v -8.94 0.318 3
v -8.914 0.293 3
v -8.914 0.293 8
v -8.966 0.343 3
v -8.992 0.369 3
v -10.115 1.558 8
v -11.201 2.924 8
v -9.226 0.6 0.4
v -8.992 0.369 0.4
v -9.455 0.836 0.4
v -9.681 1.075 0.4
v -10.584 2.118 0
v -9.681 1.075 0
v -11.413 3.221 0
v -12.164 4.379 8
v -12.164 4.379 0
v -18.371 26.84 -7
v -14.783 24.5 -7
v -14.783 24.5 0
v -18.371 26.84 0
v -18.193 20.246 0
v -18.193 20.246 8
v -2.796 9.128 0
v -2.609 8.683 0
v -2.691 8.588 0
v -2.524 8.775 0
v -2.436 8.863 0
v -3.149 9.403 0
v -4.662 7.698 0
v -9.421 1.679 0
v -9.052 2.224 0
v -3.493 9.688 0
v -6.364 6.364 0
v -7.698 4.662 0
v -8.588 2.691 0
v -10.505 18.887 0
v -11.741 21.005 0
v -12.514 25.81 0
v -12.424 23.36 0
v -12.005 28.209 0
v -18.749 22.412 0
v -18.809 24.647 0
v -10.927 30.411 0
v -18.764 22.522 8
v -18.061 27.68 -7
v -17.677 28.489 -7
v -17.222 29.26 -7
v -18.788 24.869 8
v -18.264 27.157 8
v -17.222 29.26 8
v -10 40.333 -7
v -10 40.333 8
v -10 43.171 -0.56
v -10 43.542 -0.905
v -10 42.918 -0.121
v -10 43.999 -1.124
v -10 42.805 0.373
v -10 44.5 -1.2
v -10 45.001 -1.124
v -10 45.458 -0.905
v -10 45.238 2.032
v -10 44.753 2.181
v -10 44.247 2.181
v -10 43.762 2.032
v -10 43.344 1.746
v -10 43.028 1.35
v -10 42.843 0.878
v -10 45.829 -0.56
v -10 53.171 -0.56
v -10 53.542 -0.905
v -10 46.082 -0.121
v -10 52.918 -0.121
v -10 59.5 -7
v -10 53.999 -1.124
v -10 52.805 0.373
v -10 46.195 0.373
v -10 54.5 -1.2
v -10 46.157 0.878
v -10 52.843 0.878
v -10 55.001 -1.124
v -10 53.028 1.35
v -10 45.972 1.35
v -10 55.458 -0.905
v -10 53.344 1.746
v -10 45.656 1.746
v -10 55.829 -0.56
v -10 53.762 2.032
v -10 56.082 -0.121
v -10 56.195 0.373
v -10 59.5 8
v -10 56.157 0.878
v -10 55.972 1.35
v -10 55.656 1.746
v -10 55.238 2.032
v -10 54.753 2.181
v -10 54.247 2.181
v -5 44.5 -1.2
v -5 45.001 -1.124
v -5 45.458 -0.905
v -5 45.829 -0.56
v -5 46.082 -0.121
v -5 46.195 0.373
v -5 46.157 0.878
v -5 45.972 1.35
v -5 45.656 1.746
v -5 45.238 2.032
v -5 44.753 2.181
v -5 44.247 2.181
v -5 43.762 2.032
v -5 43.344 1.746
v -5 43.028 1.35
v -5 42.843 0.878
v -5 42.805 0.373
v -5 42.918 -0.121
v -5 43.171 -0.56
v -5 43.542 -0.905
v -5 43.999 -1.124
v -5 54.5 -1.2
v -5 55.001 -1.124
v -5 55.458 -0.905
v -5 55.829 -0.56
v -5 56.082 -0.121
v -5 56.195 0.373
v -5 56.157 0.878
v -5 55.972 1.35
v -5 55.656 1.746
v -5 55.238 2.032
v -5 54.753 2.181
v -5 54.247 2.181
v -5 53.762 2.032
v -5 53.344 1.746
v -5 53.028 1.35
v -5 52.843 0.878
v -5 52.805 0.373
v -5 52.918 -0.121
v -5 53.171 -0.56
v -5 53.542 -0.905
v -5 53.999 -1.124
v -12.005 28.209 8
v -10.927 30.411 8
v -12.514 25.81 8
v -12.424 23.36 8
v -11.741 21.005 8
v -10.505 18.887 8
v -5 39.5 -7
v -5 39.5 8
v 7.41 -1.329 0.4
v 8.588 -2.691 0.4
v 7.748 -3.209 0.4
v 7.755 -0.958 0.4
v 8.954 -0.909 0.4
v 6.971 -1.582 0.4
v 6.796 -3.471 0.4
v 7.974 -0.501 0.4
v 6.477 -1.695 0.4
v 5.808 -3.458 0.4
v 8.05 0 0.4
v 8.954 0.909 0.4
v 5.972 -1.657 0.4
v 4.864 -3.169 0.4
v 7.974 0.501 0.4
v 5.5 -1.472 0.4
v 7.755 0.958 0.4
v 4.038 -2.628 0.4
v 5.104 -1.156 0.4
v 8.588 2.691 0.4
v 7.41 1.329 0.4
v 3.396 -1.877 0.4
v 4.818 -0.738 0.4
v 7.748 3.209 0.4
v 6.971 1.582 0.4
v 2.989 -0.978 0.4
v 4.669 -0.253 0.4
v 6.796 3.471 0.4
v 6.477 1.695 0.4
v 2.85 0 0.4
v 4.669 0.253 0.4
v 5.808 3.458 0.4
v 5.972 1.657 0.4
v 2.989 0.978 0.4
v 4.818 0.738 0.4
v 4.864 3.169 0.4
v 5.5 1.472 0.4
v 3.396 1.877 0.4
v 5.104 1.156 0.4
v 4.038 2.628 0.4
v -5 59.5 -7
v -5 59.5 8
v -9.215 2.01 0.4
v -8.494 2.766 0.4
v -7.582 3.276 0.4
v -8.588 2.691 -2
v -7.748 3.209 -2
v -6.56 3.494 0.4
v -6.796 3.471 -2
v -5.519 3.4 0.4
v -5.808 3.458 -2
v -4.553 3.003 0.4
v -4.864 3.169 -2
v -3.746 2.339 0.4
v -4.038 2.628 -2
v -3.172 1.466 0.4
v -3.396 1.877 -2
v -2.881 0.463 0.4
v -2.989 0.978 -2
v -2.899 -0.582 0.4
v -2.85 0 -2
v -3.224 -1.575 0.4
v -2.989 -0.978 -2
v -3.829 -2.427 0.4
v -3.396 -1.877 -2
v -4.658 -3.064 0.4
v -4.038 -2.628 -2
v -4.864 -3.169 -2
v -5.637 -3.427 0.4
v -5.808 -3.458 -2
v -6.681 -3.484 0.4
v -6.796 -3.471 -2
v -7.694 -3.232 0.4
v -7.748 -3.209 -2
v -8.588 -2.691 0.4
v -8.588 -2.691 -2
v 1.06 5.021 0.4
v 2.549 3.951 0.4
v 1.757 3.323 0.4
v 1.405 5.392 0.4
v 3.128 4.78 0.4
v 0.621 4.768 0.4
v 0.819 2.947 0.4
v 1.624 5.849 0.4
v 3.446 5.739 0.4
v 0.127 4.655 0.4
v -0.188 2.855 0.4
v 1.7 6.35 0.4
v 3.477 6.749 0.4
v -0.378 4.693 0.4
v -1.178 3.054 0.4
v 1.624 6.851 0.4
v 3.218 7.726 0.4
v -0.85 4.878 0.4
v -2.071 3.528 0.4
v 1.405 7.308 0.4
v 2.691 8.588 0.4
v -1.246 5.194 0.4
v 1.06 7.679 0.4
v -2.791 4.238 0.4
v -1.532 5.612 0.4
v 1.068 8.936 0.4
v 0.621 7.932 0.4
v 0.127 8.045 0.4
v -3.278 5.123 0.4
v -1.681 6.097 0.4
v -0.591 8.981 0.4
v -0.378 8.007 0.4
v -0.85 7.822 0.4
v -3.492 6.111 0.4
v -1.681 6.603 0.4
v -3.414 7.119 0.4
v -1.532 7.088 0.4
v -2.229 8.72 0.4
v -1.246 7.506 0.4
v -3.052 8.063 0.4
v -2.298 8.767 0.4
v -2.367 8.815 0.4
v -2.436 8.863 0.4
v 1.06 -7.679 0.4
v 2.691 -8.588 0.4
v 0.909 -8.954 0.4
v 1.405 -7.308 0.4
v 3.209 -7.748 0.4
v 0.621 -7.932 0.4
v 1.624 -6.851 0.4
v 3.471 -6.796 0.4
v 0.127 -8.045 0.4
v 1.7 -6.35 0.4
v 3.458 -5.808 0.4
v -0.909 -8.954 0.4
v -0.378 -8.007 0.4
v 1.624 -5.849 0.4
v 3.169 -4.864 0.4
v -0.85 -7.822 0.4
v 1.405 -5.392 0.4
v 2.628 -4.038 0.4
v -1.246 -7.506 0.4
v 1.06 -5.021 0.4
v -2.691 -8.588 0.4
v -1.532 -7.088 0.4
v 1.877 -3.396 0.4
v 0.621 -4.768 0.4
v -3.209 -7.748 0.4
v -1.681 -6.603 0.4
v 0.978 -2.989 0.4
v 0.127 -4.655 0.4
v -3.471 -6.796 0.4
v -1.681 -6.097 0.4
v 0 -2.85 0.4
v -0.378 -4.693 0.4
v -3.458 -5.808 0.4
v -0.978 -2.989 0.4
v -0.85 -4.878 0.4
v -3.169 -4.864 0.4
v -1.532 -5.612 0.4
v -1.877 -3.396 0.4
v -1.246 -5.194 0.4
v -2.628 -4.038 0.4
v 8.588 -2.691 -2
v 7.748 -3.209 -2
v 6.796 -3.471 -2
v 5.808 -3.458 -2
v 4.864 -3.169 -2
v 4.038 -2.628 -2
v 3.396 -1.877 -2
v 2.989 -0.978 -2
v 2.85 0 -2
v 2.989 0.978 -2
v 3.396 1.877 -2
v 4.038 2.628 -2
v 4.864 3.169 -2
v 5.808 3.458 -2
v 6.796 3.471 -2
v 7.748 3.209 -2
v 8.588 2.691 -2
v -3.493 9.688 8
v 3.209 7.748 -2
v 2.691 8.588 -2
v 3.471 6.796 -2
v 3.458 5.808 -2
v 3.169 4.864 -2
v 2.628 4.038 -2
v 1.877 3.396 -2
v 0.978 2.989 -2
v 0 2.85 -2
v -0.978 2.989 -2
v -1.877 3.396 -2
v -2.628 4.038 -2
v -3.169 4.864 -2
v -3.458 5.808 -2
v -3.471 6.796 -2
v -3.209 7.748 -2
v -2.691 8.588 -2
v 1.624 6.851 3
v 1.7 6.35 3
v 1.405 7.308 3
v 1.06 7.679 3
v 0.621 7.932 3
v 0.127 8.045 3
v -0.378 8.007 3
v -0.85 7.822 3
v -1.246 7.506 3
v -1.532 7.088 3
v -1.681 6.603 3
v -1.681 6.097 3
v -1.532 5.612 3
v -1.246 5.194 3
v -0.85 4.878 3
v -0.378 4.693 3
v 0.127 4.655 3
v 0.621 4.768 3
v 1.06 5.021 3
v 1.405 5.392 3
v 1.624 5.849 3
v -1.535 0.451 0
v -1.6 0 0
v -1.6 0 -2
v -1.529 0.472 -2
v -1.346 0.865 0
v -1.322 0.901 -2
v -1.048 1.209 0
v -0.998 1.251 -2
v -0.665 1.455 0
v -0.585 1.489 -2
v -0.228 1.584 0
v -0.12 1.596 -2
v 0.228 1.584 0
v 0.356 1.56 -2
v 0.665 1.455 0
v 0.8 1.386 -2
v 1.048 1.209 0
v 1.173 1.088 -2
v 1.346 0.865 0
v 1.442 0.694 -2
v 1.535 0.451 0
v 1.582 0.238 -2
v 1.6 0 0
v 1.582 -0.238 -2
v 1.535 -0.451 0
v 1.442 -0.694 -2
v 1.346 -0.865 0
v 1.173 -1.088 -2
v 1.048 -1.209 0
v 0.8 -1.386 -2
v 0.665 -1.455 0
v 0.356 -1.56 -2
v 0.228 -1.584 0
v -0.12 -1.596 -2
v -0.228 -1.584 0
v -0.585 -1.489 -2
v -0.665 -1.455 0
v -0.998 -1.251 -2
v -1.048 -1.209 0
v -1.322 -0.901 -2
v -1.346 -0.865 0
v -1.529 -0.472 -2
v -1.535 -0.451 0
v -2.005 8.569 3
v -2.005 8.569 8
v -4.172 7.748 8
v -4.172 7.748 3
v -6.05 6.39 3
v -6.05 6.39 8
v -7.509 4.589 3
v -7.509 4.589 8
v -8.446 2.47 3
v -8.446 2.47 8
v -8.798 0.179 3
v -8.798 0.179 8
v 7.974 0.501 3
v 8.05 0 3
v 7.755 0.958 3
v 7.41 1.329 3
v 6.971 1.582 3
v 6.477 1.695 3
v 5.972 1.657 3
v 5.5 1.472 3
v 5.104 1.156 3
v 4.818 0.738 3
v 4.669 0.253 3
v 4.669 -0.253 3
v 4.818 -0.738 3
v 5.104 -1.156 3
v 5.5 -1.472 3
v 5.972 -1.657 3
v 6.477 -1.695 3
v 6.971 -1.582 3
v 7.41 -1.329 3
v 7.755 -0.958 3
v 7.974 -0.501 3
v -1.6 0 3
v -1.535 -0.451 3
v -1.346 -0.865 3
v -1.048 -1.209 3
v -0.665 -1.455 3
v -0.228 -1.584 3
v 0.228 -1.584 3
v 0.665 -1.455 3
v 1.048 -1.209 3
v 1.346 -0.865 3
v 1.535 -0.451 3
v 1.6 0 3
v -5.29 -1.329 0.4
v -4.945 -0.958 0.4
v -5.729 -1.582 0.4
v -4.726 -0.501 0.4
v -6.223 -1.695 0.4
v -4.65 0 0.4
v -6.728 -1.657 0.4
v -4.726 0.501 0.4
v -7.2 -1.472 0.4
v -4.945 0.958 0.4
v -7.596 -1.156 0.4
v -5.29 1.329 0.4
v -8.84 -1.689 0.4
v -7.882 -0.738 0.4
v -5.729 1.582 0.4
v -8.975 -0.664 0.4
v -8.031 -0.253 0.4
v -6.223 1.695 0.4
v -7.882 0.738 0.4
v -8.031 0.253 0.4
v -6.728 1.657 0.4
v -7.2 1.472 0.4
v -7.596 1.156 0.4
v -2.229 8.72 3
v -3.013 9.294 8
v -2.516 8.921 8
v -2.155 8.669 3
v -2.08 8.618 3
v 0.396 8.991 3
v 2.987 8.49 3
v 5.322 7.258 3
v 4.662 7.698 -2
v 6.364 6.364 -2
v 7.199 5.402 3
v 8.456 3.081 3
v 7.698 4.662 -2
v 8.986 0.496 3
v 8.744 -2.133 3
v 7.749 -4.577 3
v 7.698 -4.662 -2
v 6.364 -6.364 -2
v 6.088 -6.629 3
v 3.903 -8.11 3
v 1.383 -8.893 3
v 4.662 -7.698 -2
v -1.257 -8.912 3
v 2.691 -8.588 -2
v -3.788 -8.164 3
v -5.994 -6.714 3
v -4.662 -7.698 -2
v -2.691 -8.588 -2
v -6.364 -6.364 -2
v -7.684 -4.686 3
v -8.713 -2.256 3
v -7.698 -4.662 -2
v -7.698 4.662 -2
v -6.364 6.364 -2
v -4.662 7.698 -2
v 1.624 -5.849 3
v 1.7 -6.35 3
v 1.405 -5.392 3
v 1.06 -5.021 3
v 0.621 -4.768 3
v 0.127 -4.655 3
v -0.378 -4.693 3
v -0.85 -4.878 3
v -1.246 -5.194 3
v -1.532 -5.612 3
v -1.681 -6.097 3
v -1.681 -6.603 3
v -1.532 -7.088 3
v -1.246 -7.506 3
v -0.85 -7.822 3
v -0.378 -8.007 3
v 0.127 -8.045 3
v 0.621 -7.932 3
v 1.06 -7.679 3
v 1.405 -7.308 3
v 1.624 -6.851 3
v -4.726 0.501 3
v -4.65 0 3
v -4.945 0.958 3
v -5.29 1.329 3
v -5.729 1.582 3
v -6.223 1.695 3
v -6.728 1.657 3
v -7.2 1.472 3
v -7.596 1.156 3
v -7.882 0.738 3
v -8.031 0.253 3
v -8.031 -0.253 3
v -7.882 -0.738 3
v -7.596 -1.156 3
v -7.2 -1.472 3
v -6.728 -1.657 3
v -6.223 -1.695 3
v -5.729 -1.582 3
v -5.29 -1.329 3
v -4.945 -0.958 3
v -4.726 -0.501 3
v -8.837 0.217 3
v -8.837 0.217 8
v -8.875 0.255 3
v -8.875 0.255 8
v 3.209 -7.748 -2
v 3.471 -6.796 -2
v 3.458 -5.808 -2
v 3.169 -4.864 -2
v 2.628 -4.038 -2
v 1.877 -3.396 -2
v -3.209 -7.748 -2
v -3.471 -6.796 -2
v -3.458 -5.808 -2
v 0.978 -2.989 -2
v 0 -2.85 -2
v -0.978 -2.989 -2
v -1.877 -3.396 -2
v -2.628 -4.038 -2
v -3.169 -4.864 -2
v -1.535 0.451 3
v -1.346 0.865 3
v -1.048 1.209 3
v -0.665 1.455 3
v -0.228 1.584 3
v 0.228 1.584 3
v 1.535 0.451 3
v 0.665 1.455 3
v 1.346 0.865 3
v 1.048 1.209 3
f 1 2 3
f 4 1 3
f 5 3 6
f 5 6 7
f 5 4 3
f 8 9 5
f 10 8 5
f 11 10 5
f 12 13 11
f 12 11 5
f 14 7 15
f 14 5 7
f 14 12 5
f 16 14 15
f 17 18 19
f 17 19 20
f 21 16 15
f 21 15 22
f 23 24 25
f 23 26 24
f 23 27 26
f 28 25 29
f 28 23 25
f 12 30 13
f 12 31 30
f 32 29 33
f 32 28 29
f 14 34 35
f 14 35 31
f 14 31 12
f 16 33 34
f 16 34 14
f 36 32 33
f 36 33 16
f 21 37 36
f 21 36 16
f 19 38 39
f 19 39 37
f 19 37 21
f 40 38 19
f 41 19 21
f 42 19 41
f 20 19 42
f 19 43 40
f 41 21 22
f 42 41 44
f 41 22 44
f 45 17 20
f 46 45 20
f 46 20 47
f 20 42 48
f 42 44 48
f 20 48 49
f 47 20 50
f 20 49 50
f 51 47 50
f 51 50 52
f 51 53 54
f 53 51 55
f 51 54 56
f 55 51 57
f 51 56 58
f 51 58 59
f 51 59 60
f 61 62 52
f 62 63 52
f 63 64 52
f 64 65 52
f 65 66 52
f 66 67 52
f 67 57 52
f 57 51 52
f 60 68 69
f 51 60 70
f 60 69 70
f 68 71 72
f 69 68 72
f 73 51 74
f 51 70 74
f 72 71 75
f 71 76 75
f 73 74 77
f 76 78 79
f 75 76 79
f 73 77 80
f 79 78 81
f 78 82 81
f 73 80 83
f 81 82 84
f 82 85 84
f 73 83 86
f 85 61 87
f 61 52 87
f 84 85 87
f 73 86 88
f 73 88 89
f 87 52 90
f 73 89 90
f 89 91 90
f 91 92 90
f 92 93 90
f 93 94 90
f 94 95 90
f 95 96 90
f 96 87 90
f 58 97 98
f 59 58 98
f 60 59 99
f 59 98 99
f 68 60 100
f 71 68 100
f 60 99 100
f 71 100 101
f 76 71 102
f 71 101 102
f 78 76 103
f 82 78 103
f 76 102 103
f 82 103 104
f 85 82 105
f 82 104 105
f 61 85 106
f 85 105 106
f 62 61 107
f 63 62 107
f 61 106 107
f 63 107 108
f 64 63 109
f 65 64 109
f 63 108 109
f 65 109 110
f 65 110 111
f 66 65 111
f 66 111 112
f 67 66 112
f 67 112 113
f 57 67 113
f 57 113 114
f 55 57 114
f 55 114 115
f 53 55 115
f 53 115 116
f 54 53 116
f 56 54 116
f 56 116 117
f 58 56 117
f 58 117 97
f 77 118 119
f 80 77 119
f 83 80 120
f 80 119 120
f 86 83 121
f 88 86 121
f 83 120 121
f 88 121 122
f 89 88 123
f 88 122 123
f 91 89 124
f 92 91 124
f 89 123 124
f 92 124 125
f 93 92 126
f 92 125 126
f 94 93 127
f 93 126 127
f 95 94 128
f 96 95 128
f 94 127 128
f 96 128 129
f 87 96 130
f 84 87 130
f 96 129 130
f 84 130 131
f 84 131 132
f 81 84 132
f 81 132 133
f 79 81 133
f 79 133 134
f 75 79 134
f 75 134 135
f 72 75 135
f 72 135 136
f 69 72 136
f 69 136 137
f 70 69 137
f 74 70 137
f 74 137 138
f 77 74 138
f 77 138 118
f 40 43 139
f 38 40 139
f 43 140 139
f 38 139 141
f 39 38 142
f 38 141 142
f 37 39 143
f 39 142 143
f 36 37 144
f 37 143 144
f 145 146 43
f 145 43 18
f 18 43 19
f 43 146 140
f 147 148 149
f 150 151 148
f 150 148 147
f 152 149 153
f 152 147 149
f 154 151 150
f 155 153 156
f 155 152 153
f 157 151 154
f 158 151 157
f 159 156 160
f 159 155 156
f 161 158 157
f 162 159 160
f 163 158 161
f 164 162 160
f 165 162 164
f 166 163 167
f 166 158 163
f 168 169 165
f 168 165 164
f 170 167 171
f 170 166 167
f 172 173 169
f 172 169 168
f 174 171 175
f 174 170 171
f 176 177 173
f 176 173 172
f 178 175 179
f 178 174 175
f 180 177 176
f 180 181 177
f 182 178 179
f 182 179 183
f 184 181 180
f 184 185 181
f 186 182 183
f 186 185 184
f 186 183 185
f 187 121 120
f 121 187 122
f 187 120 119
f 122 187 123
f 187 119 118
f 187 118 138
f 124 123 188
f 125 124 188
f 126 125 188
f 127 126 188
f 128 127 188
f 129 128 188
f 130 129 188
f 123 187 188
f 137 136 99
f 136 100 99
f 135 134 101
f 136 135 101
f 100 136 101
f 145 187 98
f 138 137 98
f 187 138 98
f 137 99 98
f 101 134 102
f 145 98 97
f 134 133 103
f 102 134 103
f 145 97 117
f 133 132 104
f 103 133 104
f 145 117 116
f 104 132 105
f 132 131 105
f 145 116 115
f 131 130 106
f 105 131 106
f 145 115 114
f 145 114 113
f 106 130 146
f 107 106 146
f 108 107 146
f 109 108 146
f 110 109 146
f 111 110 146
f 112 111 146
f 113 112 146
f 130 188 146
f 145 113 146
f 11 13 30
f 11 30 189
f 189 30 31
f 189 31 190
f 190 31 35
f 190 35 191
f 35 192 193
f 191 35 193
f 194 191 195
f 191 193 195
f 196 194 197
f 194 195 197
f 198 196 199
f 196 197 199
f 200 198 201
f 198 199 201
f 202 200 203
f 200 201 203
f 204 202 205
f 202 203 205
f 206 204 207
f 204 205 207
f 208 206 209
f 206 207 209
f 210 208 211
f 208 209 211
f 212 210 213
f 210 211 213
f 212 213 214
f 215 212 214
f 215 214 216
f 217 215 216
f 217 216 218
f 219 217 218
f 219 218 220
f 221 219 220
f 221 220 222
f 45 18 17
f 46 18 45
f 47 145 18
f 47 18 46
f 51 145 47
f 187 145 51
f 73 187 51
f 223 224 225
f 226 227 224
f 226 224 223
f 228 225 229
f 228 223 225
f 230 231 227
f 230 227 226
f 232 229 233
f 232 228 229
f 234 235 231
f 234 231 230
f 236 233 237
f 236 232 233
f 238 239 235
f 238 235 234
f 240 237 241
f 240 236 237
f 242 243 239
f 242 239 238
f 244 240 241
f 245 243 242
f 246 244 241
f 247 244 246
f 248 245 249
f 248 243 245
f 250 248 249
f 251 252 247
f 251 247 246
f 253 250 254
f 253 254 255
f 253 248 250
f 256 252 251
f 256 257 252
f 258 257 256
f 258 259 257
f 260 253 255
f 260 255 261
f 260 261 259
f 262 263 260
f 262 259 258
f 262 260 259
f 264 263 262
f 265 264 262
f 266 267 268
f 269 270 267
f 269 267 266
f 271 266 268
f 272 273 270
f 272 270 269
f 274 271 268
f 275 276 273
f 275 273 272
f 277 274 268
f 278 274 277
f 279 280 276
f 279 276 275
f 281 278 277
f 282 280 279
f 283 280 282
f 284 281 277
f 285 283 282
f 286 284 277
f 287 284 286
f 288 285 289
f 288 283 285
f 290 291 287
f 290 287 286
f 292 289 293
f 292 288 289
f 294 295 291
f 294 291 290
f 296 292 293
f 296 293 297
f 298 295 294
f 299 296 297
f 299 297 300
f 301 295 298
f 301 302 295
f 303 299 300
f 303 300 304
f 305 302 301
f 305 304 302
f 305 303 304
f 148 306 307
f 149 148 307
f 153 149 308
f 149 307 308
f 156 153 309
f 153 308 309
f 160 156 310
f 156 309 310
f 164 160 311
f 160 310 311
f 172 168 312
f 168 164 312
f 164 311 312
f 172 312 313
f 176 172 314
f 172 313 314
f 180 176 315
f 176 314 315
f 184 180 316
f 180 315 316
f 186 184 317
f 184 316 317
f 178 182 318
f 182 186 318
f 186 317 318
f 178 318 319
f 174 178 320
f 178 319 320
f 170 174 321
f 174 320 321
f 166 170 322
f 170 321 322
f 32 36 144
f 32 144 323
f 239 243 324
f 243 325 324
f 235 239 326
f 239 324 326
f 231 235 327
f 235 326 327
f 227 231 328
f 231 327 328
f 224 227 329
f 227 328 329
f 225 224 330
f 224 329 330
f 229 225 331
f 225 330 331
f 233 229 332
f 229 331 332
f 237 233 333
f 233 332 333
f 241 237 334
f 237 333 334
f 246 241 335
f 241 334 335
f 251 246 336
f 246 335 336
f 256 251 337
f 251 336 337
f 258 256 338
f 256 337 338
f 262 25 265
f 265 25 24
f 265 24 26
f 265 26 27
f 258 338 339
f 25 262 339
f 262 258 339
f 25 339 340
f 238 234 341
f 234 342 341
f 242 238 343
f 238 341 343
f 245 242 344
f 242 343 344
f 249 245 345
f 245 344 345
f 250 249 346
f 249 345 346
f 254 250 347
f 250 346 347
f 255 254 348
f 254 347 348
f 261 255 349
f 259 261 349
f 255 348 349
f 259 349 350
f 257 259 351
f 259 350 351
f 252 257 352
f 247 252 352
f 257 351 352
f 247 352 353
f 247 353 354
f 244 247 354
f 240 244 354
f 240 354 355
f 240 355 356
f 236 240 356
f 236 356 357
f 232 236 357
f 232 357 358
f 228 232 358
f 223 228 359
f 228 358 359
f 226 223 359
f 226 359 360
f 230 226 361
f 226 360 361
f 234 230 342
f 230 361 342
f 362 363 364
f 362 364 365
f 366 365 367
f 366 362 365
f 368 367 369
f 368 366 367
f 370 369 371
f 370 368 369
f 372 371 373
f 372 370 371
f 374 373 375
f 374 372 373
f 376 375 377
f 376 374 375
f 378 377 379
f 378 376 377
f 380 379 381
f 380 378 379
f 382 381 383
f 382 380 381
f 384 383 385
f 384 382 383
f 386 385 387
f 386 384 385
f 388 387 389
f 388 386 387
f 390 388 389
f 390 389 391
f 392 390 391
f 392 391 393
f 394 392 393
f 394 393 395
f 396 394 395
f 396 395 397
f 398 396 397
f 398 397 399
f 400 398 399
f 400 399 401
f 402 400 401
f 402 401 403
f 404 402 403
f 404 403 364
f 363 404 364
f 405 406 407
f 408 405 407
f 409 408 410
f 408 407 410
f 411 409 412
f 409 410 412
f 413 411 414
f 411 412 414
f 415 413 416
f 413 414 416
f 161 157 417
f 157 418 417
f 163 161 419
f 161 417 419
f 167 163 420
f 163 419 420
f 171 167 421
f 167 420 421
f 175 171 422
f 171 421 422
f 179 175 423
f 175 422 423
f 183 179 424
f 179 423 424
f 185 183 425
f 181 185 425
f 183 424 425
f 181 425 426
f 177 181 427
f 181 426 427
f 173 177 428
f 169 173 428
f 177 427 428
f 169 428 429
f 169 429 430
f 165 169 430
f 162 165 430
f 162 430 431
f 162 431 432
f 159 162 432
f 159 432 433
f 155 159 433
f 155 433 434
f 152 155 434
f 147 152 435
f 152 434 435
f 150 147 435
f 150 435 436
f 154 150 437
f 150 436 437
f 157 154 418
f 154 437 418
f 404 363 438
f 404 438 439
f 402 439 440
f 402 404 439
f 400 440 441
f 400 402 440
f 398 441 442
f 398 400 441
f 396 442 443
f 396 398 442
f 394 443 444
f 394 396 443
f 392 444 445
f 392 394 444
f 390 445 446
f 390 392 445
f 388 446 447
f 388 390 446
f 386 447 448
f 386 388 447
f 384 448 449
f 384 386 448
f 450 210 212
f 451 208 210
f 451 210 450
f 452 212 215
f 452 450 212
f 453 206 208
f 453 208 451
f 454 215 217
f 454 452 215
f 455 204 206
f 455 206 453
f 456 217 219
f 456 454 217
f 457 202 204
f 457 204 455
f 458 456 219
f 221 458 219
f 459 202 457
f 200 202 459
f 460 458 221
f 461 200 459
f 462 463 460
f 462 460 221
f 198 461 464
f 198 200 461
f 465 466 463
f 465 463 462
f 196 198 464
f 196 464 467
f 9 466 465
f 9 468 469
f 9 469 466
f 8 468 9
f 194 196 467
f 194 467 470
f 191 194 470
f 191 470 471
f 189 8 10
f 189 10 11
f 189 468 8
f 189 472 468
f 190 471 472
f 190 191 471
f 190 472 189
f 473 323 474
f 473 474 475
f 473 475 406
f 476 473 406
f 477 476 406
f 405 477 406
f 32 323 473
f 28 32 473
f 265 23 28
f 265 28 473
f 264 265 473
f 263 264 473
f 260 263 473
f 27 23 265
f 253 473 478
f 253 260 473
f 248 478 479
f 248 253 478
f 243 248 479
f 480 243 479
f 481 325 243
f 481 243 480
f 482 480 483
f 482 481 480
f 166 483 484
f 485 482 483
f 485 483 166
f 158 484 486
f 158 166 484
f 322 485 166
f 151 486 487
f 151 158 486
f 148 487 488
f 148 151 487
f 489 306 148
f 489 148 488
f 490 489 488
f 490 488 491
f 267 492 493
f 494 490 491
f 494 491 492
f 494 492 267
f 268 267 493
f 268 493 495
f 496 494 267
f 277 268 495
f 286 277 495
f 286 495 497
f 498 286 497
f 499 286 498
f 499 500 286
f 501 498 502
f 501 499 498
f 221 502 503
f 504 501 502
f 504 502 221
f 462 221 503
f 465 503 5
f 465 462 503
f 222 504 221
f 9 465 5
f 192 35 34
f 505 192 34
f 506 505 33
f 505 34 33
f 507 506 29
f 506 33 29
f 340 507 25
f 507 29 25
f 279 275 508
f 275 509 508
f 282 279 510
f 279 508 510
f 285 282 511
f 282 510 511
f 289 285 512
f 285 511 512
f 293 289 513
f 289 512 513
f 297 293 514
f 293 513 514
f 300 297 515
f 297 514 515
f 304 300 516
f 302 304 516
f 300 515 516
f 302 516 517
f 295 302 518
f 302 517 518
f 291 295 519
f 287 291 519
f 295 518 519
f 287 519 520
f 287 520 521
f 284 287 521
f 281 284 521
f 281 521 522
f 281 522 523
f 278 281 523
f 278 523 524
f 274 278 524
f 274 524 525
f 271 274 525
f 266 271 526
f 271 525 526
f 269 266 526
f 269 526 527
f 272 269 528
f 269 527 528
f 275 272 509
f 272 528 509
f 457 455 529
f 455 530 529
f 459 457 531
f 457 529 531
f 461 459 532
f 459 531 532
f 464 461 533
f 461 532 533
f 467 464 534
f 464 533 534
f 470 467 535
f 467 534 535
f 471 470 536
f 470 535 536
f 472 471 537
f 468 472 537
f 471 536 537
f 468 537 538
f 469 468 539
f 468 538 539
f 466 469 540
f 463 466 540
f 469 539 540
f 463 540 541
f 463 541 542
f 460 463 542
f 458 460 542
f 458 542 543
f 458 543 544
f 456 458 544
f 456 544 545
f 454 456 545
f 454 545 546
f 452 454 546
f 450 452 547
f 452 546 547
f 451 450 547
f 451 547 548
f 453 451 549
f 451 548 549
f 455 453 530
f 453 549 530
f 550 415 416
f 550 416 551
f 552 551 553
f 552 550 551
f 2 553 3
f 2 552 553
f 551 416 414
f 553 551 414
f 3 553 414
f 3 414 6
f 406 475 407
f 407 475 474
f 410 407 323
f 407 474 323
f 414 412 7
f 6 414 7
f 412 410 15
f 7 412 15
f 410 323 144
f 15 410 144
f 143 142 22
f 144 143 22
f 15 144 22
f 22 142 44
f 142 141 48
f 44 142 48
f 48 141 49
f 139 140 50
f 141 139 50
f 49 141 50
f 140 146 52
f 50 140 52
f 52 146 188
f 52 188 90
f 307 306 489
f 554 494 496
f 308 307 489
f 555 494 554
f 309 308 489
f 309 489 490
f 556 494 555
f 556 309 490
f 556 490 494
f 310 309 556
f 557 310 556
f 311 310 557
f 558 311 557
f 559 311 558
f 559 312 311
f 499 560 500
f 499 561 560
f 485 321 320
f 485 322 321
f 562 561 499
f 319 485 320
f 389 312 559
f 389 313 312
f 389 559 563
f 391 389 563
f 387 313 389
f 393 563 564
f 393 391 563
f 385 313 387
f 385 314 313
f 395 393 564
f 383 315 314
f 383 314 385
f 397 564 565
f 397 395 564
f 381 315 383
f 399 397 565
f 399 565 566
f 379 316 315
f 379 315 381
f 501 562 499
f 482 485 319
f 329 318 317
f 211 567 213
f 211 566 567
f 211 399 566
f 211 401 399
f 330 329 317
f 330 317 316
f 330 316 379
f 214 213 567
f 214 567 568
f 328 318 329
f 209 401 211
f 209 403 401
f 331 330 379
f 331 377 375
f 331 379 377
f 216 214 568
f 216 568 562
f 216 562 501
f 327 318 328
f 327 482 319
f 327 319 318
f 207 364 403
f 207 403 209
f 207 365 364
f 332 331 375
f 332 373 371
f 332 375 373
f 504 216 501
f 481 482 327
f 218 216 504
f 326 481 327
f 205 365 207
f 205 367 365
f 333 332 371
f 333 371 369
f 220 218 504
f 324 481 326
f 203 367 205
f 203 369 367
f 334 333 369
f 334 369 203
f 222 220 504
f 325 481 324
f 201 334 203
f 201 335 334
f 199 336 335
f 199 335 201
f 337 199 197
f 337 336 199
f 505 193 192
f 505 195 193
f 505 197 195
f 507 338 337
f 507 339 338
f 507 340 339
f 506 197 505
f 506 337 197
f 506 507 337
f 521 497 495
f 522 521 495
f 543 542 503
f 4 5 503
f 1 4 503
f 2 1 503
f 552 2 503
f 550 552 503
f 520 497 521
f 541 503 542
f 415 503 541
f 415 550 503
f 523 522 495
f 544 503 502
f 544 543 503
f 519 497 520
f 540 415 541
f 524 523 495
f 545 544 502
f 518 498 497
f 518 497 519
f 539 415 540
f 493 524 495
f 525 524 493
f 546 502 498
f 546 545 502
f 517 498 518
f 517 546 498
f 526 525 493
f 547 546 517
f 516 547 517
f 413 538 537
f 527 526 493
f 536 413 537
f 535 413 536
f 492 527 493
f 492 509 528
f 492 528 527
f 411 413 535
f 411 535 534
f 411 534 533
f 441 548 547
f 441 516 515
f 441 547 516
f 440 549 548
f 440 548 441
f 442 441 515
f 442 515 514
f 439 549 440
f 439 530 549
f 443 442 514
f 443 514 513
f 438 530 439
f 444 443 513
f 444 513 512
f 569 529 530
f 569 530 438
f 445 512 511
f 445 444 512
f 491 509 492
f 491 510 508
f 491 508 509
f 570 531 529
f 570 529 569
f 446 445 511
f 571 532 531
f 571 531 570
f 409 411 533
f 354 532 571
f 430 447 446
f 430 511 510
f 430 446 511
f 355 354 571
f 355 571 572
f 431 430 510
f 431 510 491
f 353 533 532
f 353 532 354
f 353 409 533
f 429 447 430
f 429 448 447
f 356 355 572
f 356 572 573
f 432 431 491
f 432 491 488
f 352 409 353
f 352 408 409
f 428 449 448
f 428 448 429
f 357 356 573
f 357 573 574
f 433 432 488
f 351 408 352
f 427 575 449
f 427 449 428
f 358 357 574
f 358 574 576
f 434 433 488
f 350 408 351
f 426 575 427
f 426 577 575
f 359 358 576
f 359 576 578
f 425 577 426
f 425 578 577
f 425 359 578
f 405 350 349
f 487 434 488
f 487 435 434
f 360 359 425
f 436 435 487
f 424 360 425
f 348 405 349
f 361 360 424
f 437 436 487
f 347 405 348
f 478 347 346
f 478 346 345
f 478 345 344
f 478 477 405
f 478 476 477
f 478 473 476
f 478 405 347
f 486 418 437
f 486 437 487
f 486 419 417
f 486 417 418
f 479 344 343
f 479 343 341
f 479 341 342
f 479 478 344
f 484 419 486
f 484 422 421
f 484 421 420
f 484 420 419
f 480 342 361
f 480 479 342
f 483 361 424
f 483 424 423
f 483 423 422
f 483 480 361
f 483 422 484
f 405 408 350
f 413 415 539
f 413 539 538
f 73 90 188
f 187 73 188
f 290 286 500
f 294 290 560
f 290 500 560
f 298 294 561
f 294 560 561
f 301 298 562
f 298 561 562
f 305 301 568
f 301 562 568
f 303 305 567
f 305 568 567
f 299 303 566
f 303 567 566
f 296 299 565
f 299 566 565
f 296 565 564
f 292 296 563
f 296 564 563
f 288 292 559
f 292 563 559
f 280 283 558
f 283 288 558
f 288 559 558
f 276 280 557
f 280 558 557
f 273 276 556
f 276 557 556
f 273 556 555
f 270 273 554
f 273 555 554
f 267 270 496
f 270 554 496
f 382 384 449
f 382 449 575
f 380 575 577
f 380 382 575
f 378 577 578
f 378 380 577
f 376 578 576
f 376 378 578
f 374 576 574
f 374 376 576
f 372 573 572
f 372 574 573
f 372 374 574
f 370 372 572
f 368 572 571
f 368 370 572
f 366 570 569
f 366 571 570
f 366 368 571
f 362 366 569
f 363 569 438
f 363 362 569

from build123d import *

# Parameters (mm, degrees)
SKETCH_1_R                   = 1.6
EXTRUDE_1_DEPTH              = 8
EXTRUDE_2_DEPTH              = 15
FILLET_1_R                   = 10
SKETCH_3_R                   = 8.8
CUT_EXTRUDE_1_DEPTH          = 5
SKETCH_4_R                   = 9
SKETCH_4_R_2                 = 1.6000000000000003
EXTRUDE_3_DEPTH              = 2
EXTRUDE_3_DIRECTION_2_REACH  = 64.924
HOLE_WIZARD_M3_1_D           = 3.4
HOLE_WIZARD_M3_1_CBORE_D     = 7
HOLE_WIZARD_M3_1_CBORE_DEPTH = 2.4
HOLE_WIZARD_M3_1_2_D         = 3.4


with BuildPart() as part:
    # 스케치1 → 보스-돌출1 (new body)
    with BuildSketch(Plane.XY):
        with BuildLine():
            Line((-12.16427952654043, 4.378638787940105), (-20.000000000000004, 25))
            Line((-20.000000000000004, 25), (-10.000000000000002, 40.33333333333329))
            Line((-10.000000000000002, 40.33333333333329), (-10.000000000000005, 59.5))
            Line((-10.000000000000005, 59.5), (-5.000000000000006, 59.5))
            Line((-5.000000000000006, 59.5), (-5.000000000000006, 39.5))
            Line((-5.000000000000006, 39.5), (-14.782608695652206, 24.5))
            Line((-14.782608695652206, 24.5), (-3.493383141466383, 9.687944683099722))
            ThreePointArc((-3.493383141466383, 9.687944683099722), (-0.9090438204077795, 7.9117774771707445), (1.988107412927463, 6.7117381440773505))
            ThreePointArc((1.988107412927463, 6.7117381440773505), (5.440021730198806, -4.405242737348851), (-6.151719788633741, -3.3401113218172886))
            ThreePointArc((-6.151719788633741, -3.3401113218172886), (-7.393946440543873, -1.418082905068042), (-8.914100921678212, 0.29260427936827865))
            ThreePointArc((-8.914100921678212, 0.29260427936827865), (-10.673096649546496, 2.229107553388852), (-12.16427952654043, 4.378638787940105))
        make_face()
        Circle(SKETCH_1_R, mode=Mode.SUBTRACT)
    extrude(amount=EXTRUDE_1_DEPTH)

    # 스케치2 → 보스-돌출2 (add)
    with BuildSketch(Plane.XY.offset(8)):
        Polygon((-14.782608695652206, 24.5), (-18.671865990081887, 27.036472148541108), (-10.000000000000002, 40.33333333333329), (-10.000000000000005, 59.5), (-5.000000000000006, 59.5), (-5.000000000000006, 39.5), align=None)
    extrude(amount=-EXTRUDE_2_DEPTH)

    # 필렛1
    fillet_1_edges = [part.edges().sort_by_distance(p)[0] for p in [
        (-14.782608695652206, 24.5, 4),
        (-20.000000000000004, 25, 4),
    ]]
    fillet(fillet_1_edges, radius=FILLET_1_R)

    # 스케치3 → 컷-돌출1 (cut)
    with BuildSketch(Plane.XY.offset(8)):
        Circle(SKETCH_3_R)
    extrude(amount=-CUT_EXTRUDE_1_DEPTH, mode=Mode.SUBTRACT)

    # 스케치4 → 보스-돌출3 (add)
    with BuildSketch(Plane(origin=(0, 0, 0), x_dir=(-1, 0, 0), z_dir=(0, 0, -1))):
        Circle(SKETCH_4_R)
        Circle(SKETCH_4_R_2, mode=Mode.SUBTRACT)
    extrude(amount=EXTRUDE_3_DEPTH)

    # 보스-돌출3 direction 2: up to this face of the body (flat: up to its plane)
    extrude_3_direction_2_end = Plane(part.part.faces().sort_by_distance((-0.17036429, 7.291732251, 3))[0])
    # 스케치4 → 보스-돌출3 direction 2 (add, up to the picked face)
    with BuildSketch(Plane(origin=(0, 0, 0), x_dir=(-1, 0, 0), z_dir=(0, 0, -1)), mode=Mode.PRIVATE) as extrude_3_direction_2_sk1:
        Circle(SKETCH_4_R)
        Circle(SKETCH_4_R_2, mode=Mode.SUBTRACT)
    extrude_3_direction_2_tool1 = split(extrude(extrude_3_direction_2_sk1.sketch, amount=-EXTRUDE_3_DIRECTION_2_REACH, mode=Mode.PRIVATE), bisect_by=extrude_3_direction_2_end, keep=Keep.BOTH, mode=Mode.PRIVATE)
    add(extrude_3_direction_2_tool1.solids().sort_by(Axis((8.745442, 0, 0), (0, 0, 1)))[0])

    # Hole Wizard M3 _ _ _ _1 (through all)
    with Locations(Plane(origin=(0, 0, -2), x_dir=(-1, 0, 0), z_dir=(0, 0, -1))):
        with Locations((0, 6.35), (6.35, 0), (0, -6.35), (-6.35, 0)):
            CounterBoreHole(HOLE_WIZARD_M3_1_D / 2, HOLE_WIZARD_M3_1_CBORE_D / 2, HOLE_WIZARD_M3_1_CBORE_DEPTH)

    # Hole Wizard M3 _ _1 2 (through all)
    with Locations(Plane.ZY.offset(9.999999999999995)):
        with Locations((0.5, 54.5), (0.5, 44.5)):
            Hole(HOLE_WIZARD_M3_1_2_D / 2)


solid = part.part
